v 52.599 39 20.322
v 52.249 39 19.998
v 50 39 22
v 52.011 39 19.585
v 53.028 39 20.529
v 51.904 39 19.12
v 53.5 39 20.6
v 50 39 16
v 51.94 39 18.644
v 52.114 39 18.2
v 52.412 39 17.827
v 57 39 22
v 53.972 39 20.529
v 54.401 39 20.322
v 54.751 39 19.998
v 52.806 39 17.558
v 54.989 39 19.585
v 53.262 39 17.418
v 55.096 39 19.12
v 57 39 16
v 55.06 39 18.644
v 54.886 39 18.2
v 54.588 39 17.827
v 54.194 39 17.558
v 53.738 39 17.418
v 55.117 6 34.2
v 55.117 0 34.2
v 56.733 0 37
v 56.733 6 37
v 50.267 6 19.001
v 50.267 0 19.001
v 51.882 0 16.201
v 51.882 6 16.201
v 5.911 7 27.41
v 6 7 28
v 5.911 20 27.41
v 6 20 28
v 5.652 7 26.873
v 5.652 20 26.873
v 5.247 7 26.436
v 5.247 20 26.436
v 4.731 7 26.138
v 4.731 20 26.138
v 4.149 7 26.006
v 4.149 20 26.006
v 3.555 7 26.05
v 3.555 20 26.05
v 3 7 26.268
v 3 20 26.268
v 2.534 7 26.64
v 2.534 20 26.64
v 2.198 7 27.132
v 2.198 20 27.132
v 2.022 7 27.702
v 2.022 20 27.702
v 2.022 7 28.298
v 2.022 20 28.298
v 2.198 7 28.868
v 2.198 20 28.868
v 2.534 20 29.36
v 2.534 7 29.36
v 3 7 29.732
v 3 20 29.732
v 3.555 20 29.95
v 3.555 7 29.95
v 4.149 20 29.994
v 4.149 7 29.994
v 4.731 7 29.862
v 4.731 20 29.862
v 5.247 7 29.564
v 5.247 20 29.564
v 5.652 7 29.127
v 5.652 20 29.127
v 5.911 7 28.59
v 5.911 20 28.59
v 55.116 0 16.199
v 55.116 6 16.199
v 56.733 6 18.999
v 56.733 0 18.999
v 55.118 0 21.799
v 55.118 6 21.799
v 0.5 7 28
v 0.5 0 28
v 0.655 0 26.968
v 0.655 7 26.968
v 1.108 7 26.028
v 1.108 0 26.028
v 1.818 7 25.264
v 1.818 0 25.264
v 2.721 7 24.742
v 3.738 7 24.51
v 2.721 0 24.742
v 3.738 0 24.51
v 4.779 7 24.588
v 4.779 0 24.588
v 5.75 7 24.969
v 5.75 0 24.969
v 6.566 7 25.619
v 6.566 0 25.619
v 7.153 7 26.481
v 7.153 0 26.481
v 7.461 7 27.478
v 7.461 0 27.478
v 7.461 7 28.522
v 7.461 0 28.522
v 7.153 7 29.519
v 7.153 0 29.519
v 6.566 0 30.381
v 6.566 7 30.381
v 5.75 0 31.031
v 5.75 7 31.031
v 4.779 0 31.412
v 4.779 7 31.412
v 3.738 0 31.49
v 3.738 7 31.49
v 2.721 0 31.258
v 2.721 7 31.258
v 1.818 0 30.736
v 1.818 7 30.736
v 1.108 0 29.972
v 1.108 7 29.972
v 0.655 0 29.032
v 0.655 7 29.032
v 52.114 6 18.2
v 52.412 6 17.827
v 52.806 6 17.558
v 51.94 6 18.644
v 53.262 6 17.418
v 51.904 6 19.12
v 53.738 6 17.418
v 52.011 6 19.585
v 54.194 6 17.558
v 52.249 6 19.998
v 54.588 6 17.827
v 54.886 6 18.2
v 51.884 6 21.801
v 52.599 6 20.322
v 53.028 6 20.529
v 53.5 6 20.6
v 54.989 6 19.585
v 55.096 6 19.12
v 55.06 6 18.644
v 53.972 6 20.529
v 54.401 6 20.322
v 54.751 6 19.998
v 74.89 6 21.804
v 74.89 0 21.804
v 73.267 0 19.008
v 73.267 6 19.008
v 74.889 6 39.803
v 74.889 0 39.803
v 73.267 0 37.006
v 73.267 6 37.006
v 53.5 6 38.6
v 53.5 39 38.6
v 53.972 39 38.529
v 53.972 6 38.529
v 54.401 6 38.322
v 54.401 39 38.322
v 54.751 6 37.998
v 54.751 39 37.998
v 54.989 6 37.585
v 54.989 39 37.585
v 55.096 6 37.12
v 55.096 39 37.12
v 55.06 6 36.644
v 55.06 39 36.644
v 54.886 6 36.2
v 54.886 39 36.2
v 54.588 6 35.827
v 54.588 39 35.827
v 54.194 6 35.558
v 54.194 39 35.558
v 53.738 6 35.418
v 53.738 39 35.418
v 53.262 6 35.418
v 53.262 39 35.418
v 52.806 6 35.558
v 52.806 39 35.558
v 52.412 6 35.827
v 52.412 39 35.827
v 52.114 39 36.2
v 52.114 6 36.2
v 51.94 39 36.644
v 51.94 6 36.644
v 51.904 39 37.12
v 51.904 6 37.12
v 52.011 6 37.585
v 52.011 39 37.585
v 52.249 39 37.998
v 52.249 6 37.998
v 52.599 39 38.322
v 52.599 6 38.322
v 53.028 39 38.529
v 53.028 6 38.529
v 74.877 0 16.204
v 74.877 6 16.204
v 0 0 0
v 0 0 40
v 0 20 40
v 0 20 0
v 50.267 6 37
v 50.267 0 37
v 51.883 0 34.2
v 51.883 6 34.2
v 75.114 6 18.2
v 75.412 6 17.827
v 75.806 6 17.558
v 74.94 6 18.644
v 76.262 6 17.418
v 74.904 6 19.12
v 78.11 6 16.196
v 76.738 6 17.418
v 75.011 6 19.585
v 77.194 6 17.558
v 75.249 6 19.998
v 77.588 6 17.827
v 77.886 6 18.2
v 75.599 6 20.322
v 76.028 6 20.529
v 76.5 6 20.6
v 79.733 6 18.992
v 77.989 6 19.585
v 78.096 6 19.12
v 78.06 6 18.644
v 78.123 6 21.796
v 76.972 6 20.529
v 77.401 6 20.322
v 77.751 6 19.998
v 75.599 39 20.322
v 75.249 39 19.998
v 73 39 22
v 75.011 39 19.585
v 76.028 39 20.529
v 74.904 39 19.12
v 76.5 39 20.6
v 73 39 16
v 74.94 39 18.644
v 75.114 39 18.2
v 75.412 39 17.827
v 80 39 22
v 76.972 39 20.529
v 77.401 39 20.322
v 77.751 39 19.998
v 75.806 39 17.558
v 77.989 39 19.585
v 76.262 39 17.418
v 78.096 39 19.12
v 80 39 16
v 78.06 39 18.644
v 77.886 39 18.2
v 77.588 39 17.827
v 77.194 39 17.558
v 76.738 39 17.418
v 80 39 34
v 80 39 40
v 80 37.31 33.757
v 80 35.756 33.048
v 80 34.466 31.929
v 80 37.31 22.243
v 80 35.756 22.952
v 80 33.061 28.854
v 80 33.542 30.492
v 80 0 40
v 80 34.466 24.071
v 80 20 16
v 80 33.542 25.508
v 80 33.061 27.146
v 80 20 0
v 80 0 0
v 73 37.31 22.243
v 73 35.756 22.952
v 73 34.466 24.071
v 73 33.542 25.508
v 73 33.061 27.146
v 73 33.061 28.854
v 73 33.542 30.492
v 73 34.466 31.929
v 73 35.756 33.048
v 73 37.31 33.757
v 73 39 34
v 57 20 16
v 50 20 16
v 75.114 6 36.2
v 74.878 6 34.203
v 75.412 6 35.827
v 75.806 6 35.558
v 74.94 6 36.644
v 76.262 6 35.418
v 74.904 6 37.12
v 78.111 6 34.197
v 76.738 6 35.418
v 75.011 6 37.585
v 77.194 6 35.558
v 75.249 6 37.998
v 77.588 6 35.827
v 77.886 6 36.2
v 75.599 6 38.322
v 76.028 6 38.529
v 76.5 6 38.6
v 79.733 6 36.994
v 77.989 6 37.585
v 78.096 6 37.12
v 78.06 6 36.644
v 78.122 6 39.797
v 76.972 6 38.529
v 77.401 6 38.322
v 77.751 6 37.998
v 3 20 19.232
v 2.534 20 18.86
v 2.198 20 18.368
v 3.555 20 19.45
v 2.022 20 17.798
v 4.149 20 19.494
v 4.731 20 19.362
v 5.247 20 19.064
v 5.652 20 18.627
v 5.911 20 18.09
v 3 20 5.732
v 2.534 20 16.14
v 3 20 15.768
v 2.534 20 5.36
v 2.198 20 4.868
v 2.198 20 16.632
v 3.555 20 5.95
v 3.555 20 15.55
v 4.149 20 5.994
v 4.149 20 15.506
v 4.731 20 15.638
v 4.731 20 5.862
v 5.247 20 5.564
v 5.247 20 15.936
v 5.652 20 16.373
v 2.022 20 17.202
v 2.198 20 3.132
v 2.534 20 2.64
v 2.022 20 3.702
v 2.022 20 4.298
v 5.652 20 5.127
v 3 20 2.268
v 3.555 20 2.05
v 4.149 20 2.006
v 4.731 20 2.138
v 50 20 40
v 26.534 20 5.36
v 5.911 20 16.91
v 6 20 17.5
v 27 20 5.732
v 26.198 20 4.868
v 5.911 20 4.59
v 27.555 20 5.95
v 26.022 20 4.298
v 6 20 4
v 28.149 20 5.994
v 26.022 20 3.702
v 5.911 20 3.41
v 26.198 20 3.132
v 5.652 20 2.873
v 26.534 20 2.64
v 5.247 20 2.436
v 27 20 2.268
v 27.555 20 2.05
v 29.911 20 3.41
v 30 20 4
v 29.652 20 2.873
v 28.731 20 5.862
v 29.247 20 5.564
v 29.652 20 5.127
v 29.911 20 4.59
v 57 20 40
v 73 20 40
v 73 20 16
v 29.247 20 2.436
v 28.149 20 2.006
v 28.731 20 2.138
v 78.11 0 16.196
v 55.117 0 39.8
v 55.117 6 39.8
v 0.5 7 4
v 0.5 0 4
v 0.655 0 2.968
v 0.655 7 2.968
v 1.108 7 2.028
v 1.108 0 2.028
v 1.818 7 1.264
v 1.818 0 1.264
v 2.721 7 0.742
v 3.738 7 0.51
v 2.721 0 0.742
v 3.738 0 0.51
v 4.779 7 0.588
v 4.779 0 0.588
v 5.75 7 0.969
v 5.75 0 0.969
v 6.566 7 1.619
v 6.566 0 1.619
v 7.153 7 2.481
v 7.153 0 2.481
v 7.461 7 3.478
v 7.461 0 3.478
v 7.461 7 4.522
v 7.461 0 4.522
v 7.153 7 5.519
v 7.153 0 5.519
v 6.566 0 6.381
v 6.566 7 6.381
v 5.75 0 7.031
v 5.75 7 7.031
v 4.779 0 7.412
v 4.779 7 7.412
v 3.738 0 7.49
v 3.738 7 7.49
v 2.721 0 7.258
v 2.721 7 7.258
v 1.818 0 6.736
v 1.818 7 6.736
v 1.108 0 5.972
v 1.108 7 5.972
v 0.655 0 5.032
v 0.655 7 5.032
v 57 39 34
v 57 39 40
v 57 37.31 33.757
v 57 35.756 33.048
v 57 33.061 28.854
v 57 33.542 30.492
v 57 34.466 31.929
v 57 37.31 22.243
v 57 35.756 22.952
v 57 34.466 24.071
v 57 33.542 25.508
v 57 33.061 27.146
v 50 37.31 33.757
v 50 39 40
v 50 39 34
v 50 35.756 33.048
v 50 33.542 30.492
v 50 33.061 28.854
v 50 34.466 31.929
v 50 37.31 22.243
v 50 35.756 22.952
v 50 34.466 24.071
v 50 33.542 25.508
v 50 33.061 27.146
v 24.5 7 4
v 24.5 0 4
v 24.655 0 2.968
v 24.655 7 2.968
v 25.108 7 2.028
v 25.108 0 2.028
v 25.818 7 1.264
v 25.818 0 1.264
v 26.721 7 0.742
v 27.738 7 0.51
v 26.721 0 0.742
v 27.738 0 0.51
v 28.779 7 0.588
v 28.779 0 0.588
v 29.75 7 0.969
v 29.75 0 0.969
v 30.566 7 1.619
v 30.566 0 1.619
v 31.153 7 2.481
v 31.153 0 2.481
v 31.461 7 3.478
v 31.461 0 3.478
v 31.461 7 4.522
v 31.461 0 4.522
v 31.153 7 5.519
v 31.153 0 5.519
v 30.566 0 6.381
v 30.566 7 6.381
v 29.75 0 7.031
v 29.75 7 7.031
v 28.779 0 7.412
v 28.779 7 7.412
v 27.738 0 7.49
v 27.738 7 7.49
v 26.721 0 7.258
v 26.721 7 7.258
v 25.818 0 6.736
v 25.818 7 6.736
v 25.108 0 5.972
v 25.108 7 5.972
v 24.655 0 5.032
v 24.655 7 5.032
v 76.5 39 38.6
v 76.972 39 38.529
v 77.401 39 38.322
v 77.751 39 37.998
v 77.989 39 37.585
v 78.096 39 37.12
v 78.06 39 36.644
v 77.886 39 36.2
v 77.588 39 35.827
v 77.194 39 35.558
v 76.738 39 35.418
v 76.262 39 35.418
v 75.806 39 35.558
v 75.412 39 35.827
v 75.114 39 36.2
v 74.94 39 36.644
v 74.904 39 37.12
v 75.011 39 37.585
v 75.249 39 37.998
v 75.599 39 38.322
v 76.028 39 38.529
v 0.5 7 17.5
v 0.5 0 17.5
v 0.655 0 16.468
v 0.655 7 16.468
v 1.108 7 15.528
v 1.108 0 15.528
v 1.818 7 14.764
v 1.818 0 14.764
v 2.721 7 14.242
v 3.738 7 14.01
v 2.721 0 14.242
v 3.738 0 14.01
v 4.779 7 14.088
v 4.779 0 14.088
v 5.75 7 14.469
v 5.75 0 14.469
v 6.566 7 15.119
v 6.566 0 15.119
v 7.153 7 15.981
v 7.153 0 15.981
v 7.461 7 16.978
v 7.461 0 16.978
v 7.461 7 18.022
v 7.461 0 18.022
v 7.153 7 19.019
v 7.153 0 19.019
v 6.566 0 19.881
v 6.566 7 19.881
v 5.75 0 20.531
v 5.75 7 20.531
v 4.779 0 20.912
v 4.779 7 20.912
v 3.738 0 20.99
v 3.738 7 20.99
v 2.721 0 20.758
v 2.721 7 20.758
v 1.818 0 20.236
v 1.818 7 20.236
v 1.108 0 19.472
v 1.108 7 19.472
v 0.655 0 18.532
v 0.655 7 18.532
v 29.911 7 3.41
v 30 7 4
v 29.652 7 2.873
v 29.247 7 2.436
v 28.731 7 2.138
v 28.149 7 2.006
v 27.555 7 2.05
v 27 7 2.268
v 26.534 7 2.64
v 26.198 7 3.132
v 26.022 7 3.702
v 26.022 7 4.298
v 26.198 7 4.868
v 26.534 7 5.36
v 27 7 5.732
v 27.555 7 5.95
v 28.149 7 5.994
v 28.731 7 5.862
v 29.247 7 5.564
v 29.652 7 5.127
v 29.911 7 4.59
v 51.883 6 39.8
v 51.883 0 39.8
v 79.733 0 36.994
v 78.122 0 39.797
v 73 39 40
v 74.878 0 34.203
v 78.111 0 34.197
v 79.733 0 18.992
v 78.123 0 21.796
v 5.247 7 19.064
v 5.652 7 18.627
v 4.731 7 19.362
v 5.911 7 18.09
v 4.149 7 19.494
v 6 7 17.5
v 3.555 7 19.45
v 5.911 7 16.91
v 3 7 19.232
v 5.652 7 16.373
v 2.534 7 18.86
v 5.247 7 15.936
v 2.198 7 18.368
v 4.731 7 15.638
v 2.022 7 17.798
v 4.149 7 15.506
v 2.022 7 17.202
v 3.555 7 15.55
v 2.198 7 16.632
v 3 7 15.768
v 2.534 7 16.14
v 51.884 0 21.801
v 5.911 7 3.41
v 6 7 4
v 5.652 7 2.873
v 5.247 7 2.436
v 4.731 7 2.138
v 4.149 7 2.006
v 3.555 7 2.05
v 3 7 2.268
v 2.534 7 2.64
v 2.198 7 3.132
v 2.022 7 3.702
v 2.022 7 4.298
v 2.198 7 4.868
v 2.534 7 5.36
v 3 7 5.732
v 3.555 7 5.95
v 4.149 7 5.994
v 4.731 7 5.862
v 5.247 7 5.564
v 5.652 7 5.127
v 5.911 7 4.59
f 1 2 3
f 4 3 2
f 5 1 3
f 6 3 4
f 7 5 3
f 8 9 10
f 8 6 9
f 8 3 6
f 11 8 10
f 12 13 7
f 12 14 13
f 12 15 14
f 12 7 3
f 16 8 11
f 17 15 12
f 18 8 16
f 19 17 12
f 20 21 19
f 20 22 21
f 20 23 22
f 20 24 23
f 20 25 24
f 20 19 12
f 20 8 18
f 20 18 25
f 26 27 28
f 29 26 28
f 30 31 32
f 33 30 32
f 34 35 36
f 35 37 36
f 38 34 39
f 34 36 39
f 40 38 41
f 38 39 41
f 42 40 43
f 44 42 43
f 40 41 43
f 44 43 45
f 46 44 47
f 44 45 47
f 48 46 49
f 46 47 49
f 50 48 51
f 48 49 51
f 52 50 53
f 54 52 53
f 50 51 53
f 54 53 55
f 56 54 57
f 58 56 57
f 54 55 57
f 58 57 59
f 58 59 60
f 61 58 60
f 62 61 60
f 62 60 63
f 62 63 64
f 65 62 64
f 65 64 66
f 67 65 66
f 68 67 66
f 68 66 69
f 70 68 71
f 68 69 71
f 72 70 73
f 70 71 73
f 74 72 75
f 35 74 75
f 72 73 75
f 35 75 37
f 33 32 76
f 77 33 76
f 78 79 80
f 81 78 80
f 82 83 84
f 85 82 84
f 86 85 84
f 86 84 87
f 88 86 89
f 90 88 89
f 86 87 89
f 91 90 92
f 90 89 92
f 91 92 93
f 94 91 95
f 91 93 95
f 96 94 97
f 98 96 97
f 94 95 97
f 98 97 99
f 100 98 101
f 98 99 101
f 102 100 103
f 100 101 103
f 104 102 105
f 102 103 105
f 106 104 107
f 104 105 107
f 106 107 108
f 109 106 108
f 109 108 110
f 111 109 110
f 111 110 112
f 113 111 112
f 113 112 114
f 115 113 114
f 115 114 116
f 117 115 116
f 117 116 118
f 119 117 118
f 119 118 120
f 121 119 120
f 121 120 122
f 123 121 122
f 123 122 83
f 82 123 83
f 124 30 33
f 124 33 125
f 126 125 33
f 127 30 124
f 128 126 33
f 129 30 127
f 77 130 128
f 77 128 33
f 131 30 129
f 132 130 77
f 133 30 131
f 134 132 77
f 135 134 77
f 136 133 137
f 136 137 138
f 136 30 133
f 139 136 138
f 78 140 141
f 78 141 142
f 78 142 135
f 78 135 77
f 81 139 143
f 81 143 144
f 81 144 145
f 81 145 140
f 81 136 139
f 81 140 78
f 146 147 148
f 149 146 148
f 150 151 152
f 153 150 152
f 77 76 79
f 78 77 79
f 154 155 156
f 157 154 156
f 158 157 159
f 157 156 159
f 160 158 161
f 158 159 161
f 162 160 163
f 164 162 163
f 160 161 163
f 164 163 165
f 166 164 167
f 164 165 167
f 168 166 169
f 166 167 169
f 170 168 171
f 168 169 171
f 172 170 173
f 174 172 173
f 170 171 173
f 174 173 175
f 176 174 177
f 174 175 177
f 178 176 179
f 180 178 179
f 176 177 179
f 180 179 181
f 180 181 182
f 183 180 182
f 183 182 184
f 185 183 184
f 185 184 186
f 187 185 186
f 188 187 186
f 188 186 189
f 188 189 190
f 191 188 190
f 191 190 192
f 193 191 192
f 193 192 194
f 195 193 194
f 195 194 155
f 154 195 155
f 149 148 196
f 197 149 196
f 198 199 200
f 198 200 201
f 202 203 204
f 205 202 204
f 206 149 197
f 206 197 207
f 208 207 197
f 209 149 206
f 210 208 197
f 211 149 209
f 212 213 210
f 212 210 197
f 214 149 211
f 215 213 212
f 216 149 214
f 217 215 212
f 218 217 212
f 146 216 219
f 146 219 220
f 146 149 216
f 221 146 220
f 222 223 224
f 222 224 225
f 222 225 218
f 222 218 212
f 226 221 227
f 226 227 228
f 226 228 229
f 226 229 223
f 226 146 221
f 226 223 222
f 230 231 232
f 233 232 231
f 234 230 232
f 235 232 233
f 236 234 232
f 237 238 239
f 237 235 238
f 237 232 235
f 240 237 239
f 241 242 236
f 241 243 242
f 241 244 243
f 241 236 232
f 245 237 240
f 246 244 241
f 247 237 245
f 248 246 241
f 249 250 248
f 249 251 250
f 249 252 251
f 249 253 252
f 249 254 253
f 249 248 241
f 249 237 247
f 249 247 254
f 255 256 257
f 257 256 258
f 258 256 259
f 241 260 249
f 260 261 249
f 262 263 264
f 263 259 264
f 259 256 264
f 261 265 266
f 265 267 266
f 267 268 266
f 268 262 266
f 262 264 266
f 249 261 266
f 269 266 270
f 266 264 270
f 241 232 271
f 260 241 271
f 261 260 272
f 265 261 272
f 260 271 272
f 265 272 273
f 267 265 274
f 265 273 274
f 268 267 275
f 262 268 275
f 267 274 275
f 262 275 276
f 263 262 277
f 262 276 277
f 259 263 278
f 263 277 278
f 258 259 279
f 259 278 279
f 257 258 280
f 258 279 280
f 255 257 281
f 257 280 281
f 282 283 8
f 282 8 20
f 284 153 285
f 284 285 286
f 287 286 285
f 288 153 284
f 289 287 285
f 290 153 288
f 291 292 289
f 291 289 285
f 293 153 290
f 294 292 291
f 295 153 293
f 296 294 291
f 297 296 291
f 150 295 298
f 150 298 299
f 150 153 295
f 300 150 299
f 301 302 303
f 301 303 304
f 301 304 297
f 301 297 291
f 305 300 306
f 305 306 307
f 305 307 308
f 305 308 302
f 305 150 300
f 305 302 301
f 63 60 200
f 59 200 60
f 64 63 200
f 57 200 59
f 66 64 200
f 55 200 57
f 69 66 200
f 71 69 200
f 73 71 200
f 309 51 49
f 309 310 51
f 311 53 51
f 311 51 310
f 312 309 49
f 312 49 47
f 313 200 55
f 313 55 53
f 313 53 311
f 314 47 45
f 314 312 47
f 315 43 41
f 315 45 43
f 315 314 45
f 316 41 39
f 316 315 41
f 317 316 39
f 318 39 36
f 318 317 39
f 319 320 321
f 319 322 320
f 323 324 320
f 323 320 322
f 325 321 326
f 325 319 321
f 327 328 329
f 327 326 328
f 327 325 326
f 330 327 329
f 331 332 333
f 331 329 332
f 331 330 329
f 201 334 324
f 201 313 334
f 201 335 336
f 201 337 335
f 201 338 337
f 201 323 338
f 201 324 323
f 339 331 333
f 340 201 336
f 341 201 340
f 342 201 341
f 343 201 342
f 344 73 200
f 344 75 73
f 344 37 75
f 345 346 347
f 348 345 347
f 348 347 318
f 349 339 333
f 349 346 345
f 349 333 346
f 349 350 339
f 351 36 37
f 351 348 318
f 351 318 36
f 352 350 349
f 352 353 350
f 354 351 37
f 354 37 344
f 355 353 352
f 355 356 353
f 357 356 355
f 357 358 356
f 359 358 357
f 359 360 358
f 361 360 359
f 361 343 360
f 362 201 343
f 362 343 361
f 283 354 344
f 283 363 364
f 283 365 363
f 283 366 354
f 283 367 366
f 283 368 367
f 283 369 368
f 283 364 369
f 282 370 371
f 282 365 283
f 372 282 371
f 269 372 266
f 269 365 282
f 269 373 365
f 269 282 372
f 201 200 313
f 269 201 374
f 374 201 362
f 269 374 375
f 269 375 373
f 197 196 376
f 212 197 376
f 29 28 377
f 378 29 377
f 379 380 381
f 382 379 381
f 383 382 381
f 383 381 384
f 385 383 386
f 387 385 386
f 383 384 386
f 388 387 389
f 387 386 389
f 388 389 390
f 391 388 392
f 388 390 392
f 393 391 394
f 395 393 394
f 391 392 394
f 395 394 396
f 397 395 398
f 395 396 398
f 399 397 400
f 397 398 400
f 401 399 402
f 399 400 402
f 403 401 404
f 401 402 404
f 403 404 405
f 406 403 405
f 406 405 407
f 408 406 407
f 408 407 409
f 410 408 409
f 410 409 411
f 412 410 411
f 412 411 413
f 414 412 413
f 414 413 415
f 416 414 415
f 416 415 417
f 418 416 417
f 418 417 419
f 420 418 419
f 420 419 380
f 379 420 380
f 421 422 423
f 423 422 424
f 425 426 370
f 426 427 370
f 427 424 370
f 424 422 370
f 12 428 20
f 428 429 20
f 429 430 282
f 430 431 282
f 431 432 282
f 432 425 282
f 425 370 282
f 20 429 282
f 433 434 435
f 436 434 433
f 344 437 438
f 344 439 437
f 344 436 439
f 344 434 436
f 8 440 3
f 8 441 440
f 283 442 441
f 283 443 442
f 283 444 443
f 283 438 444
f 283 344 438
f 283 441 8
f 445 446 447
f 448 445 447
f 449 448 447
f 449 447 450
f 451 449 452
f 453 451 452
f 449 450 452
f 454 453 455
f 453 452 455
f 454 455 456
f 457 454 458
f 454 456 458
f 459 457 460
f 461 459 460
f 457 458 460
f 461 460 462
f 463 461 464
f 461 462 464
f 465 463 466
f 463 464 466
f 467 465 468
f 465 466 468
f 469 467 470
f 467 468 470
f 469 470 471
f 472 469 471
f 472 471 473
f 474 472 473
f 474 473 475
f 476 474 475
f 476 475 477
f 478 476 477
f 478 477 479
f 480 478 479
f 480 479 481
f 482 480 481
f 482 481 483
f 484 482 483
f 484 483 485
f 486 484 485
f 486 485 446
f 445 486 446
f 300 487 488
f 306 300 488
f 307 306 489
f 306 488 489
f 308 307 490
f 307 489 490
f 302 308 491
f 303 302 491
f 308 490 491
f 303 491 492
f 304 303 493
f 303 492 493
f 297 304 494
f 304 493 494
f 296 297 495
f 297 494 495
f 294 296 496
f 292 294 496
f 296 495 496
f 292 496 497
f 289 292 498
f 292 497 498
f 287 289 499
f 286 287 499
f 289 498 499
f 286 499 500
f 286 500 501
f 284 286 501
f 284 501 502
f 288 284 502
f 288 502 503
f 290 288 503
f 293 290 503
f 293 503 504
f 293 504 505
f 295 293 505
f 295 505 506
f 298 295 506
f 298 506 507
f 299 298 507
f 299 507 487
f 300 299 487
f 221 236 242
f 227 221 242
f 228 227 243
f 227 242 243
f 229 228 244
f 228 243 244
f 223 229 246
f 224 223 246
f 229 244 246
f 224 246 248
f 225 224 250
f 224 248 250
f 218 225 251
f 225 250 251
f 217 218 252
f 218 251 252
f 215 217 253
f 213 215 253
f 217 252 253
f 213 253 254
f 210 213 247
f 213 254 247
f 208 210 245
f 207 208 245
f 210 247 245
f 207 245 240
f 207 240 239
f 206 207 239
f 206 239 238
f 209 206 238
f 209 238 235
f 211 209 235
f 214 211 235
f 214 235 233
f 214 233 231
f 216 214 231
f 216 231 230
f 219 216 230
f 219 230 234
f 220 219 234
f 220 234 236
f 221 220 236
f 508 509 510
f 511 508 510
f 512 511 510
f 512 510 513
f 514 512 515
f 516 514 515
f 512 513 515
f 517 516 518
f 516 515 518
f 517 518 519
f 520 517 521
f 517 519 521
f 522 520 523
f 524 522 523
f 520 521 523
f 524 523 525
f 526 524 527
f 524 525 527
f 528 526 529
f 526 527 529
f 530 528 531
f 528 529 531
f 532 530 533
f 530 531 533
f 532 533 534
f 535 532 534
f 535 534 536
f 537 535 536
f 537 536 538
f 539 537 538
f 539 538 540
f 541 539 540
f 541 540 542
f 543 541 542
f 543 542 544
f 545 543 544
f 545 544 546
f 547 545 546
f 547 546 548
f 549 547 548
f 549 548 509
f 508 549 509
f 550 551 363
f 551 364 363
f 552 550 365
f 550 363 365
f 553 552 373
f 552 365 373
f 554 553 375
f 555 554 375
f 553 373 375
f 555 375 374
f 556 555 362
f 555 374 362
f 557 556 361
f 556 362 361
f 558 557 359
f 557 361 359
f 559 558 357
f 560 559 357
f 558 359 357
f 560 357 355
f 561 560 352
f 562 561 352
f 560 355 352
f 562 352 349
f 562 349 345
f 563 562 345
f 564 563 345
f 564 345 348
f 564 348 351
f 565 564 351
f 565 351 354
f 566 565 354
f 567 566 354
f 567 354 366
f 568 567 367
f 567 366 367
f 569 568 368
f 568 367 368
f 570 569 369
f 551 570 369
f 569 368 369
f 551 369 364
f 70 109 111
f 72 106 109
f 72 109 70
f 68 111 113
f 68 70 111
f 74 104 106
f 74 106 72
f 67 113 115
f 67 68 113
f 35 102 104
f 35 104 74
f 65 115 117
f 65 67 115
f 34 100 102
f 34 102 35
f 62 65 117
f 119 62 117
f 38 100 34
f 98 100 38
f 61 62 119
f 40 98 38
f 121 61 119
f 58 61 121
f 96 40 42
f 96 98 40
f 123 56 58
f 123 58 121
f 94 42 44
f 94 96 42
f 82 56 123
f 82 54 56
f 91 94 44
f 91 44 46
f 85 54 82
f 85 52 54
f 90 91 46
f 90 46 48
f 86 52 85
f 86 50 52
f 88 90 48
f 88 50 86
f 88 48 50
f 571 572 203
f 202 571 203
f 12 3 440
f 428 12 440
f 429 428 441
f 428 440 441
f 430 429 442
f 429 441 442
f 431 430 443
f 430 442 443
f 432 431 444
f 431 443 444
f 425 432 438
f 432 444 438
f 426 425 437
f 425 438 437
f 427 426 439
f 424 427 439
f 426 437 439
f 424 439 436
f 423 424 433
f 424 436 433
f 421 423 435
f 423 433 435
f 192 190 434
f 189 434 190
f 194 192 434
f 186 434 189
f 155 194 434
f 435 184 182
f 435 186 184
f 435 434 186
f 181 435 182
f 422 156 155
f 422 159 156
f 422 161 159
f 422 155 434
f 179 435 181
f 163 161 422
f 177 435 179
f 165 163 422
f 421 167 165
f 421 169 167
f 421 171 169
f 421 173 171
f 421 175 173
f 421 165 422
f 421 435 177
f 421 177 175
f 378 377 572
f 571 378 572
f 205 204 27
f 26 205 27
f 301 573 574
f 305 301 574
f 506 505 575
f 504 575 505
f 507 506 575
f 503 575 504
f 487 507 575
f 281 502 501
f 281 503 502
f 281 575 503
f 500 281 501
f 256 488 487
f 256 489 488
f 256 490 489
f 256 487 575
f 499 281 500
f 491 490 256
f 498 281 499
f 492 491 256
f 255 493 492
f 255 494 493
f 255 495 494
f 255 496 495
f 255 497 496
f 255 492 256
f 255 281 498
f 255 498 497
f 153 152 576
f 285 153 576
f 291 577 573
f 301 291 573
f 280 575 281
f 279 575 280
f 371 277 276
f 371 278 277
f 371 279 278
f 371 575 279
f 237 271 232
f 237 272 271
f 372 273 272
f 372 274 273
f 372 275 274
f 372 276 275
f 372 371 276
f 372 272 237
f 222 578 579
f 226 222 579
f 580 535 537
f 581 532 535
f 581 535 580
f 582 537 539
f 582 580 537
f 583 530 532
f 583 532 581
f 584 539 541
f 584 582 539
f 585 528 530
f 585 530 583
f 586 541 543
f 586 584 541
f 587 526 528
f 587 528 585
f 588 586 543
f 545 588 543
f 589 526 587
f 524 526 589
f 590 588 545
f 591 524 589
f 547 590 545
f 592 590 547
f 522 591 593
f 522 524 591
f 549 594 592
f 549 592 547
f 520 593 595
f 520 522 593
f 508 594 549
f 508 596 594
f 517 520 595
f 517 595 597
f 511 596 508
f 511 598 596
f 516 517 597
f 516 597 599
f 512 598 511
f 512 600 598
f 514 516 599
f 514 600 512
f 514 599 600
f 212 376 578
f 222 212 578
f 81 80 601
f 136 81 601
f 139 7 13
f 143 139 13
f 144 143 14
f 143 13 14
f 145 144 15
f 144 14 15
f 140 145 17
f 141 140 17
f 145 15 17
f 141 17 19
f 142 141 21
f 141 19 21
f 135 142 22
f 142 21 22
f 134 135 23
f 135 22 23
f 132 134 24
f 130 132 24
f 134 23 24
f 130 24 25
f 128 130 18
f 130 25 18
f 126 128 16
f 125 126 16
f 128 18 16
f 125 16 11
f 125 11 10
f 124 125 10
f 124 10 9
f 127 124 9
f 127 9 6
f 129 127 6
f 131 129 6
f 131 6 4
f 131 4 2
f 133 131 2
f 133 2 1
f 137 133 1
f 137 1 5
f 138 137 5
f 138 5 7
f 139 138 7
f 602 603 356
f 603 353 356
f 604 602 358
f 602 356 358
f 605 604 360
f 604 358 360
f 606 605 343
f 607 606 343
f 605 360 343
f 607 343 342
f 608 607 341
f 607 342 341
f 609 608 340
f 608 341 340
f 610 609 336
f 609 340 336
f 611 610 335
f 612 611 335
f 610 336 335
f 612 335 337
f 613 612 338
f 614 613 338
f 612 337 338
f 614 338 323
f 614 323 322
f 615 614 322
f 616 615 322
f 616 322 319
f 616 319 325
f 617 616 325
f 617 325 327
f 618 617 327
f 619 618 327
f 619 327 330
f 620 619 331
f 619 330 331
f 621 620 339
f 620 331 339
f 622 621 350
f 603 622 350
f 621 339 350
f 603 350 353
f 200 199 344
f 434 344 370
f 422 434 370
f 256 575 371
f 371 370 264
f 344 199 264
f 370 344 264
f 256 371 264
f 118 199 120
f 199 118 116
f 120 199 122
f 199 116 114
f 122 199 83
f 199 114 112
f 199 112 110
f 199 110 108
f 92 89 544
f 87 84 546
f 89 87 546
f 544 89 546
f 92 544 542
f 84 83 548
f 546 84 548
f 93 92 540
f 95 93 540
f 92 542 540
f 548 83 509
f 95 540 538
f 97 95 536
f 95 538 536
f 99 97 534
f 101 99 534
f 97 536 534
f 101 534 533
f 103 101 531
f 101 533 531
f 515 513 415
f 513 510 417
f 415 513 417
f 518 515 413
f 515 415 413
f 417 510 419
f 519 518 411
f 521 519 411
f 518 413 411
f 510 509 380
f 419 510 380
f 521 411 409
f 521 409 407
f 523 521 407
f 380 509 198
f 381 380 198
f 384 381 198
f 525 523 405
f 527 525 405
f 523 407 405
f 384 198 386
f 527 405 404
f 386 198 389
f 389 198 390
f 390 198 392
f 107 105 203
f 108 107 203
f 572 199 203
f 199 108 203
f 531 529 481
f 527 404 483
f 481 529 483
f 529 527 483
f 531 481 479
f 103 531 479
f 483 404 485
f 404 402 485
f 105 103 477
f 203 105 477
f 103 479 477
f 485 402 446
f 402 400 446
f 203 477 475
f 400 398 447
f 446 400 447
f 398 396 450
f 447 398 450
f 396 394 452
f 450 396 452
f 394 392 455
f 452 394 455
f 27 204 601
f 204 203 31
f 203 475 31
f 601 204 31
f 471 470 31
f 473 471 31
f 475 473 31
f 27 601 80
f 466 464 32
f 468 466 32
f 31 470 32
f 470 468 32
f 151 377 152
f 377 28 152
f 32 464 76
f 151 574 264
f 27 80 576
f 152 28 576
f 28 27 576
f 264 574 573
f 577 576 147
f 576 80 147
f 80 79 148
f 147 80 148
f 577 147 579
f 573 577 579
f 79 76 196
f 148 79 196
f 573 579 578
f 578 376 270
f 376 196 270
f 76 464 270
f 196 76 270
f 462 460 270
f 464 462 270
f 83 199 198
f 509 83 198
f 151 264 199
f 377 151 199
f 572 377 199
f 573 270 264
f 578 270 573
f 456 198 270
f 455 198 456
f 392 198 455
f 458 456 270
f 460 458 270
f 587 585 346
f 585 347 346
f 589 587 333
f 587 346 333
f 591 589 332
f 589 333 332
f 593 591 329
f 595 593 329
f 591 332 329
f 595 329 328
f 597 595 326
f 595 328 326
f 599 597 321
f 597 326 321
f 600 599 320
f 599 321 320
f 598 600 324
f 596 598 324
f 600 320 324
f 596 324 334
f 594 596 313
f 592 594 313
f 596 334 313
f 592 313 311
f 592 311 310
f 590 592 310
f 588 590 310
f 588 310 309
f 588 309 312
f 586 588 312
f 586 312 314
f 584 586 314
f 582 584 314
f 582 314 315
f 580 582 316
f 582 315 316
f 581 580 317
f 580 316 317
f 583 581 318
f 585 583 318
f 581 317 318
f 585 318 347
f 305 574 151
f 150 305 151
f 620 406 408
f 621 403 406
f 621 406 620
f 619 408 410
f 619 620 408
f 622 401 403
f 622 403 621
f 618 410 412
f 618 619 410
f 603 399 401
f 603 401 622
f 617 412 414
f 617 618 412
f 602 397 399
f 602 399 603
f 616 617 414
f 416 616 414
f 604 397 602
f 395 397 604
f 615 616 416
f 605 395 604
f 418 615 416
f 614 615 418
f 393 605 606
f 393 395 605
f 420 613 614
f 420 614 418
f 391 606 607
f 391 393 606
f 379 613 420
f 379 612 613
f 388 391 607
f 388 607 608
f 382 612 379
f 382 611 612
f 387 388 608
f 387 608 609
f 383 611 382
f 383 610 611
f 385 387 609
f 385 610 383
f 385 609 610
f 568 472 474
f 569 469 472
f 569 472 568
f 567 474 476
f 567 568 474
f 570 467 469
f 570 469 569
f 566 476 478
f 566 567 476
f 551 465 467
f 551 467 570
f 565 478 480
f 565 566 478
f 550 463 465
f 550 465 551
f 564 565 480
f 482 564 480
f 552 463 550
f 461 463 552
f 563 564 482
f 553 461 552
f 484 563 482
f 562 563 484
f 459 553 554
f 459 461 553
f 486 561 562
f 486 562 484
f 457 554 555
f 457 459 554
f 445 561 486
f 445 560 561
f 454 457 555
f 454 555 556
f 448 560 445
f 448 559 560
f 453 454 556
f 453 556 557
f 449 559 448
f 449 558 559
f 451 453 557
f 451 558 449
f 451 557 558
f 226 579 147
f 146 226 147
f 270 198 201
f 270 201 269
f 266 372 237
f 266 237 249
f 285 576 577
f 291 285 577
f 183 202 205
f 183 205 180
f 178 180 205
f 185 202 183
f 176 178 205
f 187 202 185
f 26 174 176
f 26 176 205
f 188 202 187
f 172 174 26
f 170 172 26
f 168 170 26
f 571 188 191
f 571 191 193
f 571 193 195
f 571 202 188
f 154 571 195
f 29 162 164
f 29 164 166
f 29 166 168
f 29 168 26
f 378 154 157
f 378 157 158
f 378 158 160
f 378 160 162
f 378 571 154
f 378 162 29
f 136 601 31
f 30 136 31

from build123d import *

# Parameters (mm, degrees)
SKETCH_1_W                   = 80
SKETCH_1_H                   = 40
EXTRUDE_1_DEPTH              = 20
HOLE_WIZARD_M3_1_D           = 4
HOLE_WIZARD_M3_1_CBORE_D     = 7
HOLE_WIZARD_M3_1_CBORE_DEPTH = 7
SKETCH_6_W                   = 7
SKETCH_6_H                   = 24
EXTRUDE_2_DEPTH              = 19
CUT_EXTRUDE_1_REACH          = 76.973
SKETCH_7_R                   = 6
SKETCH_16_R                  = 1.6
CUT_EXTRUDE_2_DEPTH          = 39
CUT_EXTRUDE_3_DEPTH          = 6


with BuildPart() as part:
    # 草图1 → 凸台-拉伸1 (new body)
    with BuildSketch(Plane(origin=(0, 0, 0), x_dir=(1, 0, 0), z_dir=(0, 1, 0))):
        with Locations((40, -20)):
            Rectangle(SKETCH_1_W, SKETCH_1_H)
    extrude(amount=EXTRUDE_1_DEPTH)

    # M3 六角圆柱头螺钉的柱形沉头孔1 (through all)
    with Locations(Plane(origin=(0, 0, 0), x_dir=(-1, 0, 0), z_dir=(0, -1, 0))):
        with Locations((-4, -4), (-4, -17.5), (-4, -28), (-28, -4)):
            CounterBoreHole(HOLE_WIZARD_M3_1_D / 2, HOLE_WIZARD_M3_1_CBORE_D / 2, HOLE_WIZARD_M3_1_CBORE_DEPTH)

    # 草图6 → 凸台-拉伸2 (add)
    with BuildSketch(Plane(origin=(0, 20, 0), x_dir=(1, 0, 0), z_dir=(0, 1, 0))):
        with Locations((53.5, -28)):
            Rectangle(SKETCH_6_W, SKETCH_6_H)
        with Locations((76.5, -28)):
            Rectangle(SKETCH_6_W, SKETCH_6_H)
    extrude(amount=EXTRUDE_2_DEPTH)

    # 切除-拉伸1: up to this face of the body (flat: up to its plane)
    cut_extrude_1_end = Plane(part.part.faces().sort_by_distance((80, 17.079617834, 22.904458599))[0])
    # 草图7 → 切除-拉伸1 (cut, up to the picked face)
    with BuildSketch(Plane.ZY.offset(-50), mode=Mode.PRIVATE) as cut_extrude_1_sk1:
        with Locations((28, 39)):
            Circle(SKETCH_7_R)
    cut_extrude_1_tool1 = split(extrude(cut_extrude_1_sk1.sketch, amount=-CUT_EXTRUDE_1_REACH, mode=Mode.PRIVATE), bisect_by=cut_extrude_1_end, keep=Keep.BOTH, mode=Mode.PRIVATE)
    add(cut_extrude_1_tool1.solids().sort_by(Axis((50, 39, 28), (1, 0, 0)))[0], mode=Mode.SUBTRACT)

    # 草图16 → 切除-拉伸2 (cut)
    with BuildSketch(Plane(origin=(0, 39, 0), x_dir=(1, 0, 0), z_dir=(0, 1, 0))):
        with Locations(Location((53.5, -37, 0), (0, 0, 270))):
            Circle(SKETCH_16_R)
        with Locations(Location((53.5, -19, 0), (0, 0, 270))):
            Circle(SKETCH_16_R)
        with Locations(Location((76.5, -19, 0), (0, 0, 270))):
            Circle(SKETCH_16_R)
        with Locations(Location((76.5, -37, 0), (0, 0, 270))):
            Circle(SKETCH_16_R)
    extrude(amount=-CUT_EXTRUDE_2_DEPTH, mode=Mode.SUBTRACT)

    # 草图17 → 切除-拉伸3 (cut)
    with BuildSketch(Plane.XZ):
        Polygon((56.733161507, 37), (55.116580754, 39.8), (51.883419246, 39.8), (50.266838493, 37), (51.883419246, 34.2), (55.116580754, 34.2), align=None)
        Polygon((73.266843837, 37.005878434), (74.878331045, 34.202943845), (78.111487208, 34.197065411), (79.733156163, 36.994121566), (78.121668955, 39.797056155), (74.888512792, 39.802934589), align=None)
        Polygon((56.733161283, 18.998795225), (55.117624008, 21.799397418), (51.884462725, 21.800602193), (50.266838717, 19.001204775), (51.882375992, 16.200602582), (55.115537275, 16.199397807), align=None)
        Polygon((79.733152762, 18.992479982), (78.123088908, 21.796232417), (74.889936146, 21.803752435), (73.266847238, 19.007520018), (74.876911092, 16.203767583), (78.110063854, 16.196247565), align=None)
    extrude(amount=-CUT_EXTRUDE_3_DEPTH, mode=Mode.SUBTRACT)


solid = part.part
